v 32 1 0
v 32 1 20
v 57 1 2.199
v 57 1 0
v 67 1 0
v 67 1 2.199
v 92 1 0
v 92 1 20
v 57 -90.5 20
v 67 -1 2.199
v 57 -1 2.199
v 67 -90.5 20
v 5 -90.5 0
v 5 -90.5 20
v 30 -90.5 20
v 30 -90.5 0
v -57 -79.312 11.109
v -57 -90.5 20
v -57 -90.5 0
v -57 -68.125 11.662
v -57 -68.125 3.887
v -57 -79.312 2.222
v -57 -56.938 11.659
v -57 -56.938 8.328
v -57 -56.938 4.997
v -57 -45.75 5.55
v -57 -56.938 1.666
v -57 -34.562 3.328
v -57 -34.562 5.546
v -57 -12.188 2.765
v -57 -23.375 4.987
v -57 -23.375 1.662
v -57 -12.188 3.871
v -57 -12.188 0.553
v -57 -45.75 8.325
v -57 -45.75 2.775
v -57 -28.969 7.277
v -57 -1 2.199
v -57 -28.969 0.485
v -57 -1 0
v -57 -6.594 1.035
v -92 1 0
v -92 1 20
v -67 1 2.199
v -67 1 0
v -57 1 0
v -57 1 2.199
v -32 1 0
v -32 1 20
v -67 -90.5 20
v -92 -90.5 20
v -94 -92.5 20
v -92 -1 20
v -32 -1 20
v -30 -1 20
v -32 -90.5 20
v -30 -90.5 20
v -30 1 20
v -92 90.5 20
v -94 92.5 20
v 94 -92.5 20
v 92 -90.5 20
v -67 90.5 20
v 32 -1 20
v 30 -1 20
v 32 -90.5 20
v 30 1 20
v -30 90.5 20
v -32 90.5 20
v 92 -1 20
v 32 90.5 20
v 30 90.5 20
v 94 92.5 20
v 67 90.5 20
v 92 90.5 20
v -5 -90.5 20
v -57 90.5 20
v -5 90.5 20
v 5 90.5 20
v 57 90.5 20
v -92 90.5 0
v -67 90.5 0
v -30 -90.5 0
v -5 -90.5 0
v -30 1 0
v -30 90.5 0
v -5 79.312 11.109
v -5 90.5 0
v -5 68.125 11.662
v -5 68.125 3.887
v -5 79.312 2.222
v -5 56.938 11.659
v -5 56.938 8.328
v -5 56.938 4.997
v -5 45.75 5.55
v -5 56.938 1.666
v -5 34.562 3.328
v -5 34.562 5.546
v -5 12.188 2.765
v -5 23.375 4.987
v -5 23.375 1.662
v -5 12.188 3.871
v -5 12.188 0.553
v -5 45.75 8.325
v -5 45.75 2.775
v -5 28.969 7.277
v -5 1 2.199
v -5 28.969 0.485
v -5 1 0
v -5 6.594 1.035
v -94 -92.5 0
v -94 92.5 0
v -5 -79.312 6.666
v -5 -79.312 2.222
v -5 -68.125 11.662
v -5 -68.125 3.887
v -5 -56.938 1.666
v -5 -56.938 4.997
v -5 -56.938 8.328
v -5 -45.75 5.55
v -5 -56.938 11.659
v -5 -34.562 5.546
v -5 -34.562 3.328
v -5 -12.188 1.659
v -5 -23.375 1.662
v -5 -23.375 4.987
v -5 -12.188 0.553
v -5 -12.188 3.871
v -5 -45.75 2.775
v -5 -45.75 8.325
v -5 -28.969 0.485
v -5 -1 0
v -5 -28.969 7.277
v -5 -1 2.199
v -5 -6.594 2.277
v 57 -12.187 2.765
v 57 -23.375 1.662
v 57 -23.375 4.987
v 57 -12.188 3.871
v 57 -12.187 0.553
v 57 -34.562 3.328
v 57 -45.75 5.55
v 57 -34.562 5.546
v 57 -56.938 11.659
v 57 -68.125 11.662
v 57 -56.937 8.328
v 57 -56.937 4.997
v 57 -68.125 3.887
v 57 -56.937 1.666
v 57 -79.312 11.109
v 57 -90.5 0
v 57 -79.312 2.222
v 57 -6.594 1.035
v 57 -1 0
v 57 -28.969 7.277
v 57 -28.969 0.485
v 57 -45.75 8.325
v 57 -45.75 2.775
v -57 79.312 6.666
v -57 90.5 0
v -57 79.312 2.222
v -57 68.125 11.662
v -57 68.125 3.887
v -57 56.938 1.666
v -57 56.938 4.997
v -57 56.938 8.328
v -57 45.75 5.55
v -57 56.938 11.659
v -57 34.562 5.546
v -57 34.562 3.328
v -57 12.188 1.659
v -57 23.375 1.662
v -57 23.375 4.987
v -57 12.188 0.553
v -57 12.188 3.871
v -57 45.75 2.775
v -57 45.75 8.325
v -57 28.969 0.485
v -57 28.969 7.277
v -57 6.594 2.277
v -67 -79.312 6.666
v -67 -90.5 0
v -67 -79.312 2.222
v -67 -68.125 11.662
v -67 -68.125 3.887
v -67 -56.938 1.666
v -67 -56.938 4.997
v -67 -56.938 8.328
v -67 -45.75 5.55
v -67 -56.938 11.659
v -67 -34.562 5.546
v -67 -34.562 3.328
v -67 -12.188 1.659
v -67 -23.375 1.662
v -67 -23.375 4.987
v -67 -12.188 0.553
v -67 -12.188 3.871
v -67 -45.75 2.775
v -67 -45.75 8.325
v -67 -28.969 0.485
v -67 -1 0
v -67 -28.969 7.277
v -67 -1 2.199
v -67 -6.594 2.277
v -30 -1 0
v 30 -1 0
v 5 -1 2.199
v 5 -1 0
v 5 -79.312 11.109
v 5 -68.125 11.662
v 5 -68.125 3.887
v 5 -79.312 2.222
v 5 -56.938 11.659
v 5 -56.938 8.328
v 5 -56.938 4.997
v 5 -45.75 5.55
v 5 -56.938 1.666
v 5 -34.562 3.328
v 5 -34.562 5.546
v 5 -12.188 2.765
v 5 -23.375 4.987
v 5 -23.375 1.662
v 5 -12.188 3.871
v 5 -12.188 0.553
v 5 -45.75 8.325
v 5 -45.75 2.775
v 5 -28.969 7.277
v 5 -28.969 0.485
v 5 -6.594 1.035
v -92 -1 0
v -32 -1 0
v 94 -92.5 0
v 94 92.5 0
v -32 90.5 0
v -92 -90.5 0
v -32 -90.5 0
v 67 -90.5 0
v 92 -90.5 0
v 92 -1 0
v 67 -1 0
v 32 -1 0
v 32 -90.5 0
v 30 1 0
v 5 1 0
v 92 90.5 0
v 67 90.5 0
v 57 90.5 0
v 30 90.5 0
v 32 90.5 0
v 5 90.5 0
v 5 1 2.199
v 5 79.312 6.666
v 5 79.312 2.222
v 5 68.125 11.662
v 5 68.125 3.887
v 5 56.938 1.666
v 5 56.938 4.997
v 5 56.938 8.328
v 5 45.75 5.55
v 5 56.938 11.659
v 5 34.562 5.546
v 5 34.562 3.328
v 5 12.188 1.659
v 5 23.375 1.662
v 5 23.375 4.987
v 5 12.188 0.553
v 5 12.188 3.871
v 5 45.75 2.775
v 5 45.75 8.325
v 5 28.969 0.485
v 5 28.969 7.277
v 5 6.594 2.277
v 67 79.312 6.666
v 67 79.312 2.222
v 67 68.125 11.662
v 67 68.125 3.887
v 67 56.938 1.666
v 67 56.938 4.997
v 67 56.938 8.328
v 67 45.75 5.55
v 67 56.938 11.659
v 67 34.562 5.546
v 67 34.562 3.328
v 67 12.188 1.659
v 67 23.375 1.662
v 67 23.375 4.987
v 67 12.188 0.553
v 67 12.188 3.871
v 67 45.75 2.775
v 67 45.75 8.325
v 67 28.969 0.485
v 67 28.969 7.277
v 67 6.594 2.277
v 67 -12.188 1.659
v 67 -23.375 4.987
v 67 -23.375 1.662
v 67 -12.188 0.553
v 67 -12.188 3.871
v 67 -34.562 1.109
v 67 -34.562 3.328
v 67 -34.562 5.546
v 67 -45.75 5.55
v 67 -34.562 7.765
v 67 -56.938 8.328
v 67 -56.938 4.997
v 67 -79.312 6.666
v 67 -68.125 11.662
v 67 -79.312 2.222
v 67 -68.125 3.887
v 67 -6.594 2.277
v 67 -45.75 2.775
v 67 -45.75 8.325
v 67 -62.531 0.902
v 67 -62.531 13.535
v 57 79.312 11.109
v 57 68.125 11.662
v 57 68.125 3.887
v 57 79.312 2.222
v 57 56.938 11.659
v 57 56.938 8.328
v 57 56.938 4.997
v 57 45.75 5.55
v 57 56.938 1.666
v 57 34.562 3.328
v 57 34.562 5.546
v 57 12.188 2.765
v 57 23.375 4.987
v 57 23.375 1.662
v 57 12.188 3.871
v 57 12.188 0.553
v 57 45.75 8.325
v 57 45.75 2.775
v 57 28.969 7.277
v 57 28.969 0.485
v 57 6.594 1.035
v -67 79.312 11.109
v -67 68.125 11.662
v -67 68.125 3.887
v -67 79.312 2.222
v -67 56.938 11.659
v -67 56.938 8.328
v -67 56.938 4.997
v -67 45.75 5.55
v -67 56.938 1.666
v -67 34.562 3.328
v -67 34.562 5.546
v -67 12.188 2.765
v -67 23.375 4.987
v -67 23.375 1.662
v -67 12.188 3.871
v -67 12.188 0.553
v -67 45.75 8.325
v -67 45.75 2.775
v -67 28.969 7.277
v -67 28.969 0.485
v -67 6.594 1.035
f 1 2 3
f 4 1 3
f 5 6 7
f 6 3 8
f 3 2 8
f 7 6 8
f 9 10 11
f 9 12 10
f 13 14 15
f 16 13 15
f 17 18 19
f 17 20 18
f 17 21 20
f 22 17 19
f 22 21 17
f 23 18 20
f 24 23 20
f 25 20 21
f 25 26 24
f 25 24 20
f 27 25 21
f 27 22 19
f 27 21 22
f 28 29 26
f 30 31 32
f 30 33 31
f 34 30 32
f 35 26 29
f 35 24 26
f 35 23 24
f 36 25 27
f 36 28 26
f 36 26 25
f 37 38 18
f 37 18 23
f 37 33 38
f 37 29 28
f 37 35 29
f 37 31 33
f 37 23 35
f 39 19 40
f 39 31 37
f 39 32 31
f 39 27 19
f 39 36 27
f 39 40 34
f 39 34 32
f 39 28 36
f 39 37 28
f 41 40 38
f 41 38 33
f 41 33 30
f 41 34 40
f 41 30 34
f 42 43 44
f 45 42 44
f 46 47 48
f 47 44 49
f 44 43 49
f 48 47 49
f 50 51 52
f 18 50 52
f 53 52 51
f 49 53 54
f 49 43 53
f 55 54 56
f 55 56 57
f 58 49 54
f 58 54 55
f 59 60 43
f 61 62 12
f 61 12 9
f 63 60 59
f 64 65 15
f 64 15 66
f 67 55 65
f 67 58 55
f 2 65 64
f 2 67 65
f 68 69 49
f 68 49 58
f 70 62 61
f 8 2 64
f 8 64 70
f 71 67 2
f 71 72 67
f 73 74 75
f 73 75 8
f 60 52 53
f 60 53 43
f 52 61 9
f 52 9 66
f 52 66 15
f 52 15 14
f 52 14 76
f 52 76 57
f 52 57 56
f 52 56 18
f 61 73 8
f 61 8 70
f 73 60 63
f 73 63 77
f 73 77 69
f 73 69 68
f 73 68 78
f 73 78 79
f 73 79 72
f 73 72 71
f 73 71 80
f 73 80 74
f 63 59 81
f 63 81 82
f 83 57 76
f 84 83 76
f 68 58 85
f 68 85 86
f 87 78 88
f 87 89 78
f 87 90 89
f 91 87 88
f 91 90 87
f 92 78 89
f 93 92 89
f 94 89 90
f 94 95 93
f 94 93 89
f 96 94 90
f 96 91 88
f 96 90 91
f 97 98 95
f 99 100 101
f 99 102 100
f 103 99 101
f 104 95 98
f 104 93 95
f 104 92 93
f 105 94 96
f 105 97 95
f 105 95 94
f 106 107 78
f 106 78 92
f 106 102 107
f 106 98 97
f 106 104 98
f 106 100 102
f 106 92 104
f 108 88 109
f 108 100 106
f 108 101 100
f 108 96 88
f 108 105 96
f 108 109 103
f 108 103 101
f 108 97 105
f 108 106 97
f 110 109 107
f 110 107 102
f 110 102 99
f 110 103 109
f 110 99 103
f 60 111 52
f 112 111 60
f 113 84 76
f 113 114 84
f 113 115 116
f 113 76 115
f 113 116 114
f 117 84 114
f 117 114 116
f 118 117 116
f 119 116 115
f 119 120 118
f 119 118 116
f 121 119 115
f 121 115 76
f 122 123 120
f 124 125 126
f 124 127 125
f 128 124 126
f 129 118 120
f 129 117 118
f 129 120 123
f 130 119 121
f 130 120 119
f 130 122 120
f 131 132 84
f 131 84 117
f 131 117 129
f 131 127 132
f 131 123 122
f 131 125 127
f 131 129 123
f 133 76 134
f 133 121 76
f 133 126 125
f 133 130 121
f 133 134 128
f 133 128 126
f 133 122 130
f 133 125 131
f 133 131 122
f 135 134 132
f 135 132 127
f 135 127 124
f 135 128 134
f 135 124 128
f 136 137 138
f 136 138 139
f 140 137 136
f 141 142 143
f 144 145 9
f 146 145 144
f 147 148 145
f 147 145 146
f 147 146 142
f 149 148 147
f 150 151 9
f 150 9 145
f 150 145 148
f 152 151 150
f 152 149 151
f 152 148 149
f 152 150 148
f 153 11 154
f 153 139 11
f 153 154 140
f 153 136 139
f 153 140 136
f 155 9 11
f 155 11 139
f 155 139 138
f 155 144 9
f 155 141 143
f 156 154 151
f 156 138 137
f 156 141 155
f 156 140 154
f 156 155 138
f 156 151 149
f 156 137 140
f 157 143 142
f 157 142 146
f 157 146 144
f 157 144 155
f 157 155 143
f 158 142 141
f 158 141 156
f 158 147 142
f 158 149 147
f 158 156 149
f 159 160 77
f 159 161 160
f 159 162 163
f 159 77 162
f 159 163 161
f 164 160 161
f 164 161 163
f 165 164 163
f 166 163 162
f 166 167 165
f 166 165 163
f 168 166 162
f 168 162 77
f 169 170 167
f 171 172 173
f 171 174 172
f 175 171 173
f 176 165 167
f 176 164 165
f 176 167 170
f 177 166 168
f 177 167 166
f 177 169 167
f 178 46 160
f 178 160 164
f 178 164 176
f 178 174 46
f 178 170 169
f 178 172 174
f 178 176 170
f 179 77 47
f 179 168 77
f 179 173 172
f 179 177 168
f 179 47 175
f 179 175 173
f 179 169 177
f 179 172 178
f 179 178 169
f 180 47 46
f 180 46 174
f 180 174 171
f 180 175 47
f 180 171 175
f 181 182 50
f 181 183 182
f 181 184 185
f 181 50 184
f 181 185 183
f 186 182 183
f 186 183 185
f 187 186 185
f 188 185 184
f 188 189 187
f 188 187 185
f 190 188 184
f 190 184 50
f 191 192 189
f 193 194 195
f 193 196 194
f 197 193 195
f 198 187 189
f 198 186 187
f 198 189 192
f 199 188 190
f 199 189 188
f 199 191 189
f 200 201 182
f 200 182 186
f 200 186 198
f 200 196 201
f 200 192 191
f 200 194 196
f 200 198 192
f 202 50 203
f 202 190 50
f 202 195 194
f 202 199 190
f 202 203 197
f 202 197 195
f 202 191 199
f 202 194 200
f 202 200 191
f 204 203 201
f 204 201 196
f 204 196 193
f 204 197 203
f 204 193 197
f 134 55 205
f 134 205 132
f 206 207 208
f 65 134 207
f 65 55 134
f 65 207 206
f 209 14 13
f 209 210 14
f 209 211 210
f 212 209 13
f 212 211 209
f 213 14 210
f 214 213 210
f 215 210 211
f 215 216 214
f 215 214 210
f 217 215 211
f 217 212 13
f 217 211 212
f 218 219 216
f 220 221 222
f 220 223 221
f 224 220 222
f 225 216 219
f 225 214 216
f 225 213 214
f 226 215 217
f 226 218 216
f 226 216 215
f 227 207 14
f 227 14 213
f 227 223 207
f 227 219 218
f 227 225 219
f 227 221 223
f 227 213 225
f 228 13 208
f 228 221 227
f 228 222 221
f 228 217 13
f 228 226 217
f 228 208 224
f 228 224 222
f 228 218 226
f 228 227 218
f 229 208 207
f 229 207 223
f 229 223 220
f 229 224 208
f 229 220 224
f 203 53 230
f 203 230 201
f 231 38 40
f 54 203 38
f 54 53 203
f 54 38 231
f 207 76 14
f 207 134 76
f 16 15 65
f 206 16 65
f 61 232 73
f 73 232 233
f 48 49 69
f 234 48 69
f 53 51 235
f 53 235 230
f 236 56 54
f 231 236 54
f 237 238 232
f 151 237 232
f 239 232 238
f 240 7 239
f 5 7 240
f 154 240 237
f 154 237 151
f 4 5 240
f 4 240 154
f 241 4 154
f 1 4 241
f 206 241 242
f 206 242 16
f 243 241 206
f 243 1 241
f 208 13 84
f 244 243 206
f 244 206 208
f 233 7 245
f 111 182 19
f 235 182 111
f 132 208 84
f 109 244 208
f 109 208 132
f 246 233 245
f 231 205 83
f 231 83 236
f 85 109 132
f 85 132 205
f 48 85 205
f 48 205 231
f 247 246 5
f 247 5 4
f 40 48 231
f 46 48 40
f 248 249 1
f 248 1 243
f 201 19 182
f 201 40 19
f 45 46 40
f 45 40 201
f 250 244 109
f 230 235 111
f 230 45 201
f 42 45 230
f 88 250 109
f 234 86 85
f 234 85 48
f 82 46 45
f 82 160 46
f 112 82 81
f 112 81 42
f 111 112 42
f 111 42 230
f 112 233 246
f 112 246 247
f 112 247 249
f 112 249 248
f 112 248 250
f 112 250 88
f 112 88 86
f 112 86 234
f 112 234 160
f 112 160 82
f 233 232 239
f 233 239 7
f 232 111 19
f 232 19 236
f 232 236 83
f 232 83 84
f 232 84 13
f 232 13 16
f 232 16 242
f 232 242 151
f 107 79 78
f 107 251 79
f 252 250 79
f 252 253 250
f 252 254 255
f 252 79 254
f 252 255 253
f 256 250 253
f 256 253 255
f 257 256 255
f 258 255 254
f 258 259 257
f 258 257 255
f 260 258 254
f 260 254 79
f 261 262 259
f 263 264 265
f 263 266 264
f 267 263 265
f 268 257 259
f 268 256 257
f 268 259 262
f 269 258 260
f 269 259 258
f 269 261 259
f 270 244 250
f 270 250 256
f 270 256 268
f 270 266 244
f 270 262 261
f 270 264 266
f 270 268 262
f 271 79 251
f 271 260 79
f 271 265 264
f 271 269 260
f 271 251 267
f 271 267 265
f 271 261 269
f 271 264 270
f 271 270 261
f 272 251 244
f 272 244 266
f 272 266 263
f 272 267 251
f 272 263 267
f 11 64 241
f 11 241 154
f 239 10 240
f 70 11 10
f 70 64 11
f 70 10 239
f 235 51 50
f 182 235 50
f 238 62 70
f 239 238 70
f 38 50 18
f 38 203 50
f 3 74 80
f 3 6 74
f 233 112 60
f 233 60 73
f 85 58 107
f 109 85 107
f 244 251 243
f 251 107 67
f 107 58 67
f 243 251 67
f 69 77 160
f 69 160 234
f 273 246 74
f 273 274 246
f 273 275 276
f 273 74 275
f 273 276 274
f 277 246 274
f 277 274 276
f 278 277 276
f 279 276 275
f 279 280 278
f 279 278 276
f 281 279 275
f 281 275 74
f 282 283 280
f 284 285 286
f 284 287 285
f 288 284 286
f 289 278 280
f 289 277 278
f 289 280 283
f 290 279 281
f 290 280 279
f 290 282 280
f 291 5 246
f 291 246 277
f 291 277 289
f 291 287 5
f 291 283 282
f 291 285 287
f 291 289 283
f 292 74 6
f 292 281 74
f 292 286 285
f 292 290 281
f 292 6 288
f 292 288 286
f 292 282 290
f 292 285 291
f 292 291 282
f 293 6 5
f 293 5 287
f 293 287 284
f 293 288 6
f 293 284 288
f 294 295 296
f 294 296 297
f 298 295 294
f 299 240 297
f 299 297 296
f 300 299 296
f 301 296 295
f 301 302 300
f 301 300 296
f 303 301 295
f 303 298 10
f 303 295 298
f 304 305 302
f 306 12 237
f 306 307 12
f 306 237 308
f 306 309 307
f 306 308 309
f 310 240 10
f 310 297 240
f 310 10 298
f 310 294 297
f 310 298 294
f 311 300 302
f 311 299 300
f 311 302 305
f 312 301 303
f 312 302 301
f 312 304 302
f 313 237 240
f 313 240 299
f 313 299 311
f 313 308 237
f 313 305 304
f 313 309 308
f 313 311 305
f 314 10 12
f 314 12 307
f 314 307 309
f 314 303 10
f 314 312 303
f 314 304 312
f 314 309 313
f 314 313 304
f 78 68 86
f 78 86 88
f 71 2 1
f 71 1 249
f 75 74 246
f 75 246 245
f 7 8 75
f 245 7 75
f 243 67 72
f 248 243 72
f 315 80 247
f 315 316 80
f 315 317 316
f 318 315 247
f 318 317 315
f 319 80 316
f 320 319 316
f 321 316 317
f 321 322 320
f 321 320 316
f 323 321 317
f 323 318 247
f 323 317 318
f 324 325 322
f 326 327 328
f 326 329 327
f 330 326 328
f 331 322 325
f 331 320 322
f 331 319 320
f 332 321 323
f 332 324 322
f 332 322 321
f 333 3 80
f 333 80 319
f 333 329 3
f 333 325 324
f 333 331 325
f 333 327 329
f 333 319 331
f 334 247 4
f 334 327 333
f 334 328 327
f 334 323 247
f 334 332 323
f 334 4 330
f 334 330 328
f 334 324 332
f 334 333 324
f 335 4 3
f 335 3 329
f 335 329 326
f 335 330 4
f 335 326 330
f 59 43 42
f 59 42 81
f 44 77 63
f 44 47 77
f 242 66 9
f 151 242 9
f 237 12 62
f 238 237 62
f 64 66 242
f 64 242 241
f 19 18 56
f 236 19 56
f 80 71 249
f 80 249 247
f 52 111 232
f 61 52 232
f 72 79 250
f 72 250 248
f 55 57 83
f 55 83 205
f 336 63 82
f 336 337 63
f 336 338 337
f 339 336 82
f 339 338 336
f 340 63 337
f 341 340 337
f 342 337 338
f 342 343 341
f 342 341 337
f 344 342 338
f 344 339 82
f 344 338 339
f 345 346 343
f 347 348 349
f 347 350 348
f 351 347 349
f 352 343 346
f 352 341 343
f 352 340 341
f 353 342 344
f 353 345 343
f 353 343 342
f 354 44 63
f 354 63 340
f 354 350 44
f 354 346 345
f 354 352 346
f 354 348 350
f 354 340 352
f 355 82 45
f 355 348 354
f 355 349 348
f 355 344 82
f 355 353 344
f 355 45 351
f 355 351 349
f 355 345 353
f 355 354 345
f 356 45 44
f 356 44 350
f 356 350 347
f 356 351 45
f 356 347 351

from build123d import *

# Parameters (mm, degrees)
F0_W     = 188
F0_H     = 185
F1_DEPTH = 20
F2_W     = 60
F2_H     = 89.5
F3_DEPTH = 25
F6_W     = 10
F6_H     = 20
F5_W     = 10
F5_H     = 2
F4_W     = 10
F4_H     = 20


with BuildPart() as f1:
    # F0 (on Top) → F1 (new body)
    with BuildSketch(Plane.XY):
        Rectangle(F0_W, F0_H)
    extrude(amount=F1_DEPTH)

    # F2 (on face) → F3 (cut)
    with BuildSketch(Plane.XY.offset(20)):
        with Locations((62, 45.75)):
            Rectangle(F2_W, F2_H)
        with Locations((0, 45.75)):
            Rectangle(F2_W, F2_H)
        with Locations((-62, 45.75)):
            Rectangle(F2_W, F2_H)
        with Locations((62, -45.75)):
            Rectangle(F2_W, F2_H)
        with Locations((0, -45.75)):
            Rectangle(F2_W, F2_H)
        with Locations((-62, -45.75)):
            Rectangle(F2_W, F2_H)
    extrude(amount=-F3_DEPTH, mode=Mode.SUBTRACT)

    # F6 (on face) → F8 section 0
    with BuildSketch(Plane.XZ.offset(-90.5)):
        with Locations((-62, 10)):
            Rectangle(F6_W, F6_H)
    # F5 (on Front) → F8 section 1
    with BuildSketch(Plane.XZ):
        with Locations((-62, 1)):
            Rectangle(F5_W, F5_H)
    loft()

    # F6 (on face) → F9 section 0
    with BuildSketch(Plane.XZ.offset(-90.5)):
        with Locations((0, 10)):
            Rectangle(F6_W, F6_H)
    # F5 (on Front) → F9 section 1
    with BuildSketch(Plane.XZ):
        with Locations((0, 1)):
            Rectangle(F5_W, F5_H)
    loft()

    # F6 (on face) → F10 section 0
    with BuildSketch(Plane.XZ.offset(-90.5)):
        with Locations((62, 10)):
            Rectangle(F6_W, F6_H)
    # F5 (on Front) → F10 section 1
    with BuildSketch(Plane.XZ):
        with Locations((62, 1)):
            Rectangle(F5_W, F5_H)
    loft()

    # F5 (on Front) → F11 section 0
    with BuildSketch(Plane.XZ):
        with Locations((62, 1)):
            Rectangle(F5_W, F5_H)
    # F4 (on face) → F11 section 1
    with BuildSketch(Plane(origin=(0, -90.5, 0), x_dir=(-1, 0, 0), z_dir=(0, 1, 0))):
        with Locations((-62, 10)):
            Rectangle(F4_W, F4_H)
    loft()

    # F4 (on face) → F12 section 0
    with BuildSketch(Plane(origin=(0, -90.5, 0), x_dir=(-1, 0, 0), z_dir=(0, 1, 0))):
        with Locations((0, 10)):
            Rectangle(F4_W, F4_H)
    # F5 (on Front) → F12 section 1
    with BuildSketch(Plane.XZ):
        with Locations((0, 1)):
            Rectangle(F5_W, F5_H)
    loft()

    # F4 (on face) → F13 section 0
    with BuildSketch(Plane(origin=(0, -90.5, 0), x_dir=(-1, 0, 0), z_dir=(0, 1, 0))):
        with Locations((62, 10)):
            Rectangle(F4_W, F4_H)
    # F5 (on Front) → F13 section 1
    with BuildSketch(Plane.XZ):
        with Locations((-62, 1)):
            Rectangle(F5_W, F5_H)
    loft()


solid = f1.part
